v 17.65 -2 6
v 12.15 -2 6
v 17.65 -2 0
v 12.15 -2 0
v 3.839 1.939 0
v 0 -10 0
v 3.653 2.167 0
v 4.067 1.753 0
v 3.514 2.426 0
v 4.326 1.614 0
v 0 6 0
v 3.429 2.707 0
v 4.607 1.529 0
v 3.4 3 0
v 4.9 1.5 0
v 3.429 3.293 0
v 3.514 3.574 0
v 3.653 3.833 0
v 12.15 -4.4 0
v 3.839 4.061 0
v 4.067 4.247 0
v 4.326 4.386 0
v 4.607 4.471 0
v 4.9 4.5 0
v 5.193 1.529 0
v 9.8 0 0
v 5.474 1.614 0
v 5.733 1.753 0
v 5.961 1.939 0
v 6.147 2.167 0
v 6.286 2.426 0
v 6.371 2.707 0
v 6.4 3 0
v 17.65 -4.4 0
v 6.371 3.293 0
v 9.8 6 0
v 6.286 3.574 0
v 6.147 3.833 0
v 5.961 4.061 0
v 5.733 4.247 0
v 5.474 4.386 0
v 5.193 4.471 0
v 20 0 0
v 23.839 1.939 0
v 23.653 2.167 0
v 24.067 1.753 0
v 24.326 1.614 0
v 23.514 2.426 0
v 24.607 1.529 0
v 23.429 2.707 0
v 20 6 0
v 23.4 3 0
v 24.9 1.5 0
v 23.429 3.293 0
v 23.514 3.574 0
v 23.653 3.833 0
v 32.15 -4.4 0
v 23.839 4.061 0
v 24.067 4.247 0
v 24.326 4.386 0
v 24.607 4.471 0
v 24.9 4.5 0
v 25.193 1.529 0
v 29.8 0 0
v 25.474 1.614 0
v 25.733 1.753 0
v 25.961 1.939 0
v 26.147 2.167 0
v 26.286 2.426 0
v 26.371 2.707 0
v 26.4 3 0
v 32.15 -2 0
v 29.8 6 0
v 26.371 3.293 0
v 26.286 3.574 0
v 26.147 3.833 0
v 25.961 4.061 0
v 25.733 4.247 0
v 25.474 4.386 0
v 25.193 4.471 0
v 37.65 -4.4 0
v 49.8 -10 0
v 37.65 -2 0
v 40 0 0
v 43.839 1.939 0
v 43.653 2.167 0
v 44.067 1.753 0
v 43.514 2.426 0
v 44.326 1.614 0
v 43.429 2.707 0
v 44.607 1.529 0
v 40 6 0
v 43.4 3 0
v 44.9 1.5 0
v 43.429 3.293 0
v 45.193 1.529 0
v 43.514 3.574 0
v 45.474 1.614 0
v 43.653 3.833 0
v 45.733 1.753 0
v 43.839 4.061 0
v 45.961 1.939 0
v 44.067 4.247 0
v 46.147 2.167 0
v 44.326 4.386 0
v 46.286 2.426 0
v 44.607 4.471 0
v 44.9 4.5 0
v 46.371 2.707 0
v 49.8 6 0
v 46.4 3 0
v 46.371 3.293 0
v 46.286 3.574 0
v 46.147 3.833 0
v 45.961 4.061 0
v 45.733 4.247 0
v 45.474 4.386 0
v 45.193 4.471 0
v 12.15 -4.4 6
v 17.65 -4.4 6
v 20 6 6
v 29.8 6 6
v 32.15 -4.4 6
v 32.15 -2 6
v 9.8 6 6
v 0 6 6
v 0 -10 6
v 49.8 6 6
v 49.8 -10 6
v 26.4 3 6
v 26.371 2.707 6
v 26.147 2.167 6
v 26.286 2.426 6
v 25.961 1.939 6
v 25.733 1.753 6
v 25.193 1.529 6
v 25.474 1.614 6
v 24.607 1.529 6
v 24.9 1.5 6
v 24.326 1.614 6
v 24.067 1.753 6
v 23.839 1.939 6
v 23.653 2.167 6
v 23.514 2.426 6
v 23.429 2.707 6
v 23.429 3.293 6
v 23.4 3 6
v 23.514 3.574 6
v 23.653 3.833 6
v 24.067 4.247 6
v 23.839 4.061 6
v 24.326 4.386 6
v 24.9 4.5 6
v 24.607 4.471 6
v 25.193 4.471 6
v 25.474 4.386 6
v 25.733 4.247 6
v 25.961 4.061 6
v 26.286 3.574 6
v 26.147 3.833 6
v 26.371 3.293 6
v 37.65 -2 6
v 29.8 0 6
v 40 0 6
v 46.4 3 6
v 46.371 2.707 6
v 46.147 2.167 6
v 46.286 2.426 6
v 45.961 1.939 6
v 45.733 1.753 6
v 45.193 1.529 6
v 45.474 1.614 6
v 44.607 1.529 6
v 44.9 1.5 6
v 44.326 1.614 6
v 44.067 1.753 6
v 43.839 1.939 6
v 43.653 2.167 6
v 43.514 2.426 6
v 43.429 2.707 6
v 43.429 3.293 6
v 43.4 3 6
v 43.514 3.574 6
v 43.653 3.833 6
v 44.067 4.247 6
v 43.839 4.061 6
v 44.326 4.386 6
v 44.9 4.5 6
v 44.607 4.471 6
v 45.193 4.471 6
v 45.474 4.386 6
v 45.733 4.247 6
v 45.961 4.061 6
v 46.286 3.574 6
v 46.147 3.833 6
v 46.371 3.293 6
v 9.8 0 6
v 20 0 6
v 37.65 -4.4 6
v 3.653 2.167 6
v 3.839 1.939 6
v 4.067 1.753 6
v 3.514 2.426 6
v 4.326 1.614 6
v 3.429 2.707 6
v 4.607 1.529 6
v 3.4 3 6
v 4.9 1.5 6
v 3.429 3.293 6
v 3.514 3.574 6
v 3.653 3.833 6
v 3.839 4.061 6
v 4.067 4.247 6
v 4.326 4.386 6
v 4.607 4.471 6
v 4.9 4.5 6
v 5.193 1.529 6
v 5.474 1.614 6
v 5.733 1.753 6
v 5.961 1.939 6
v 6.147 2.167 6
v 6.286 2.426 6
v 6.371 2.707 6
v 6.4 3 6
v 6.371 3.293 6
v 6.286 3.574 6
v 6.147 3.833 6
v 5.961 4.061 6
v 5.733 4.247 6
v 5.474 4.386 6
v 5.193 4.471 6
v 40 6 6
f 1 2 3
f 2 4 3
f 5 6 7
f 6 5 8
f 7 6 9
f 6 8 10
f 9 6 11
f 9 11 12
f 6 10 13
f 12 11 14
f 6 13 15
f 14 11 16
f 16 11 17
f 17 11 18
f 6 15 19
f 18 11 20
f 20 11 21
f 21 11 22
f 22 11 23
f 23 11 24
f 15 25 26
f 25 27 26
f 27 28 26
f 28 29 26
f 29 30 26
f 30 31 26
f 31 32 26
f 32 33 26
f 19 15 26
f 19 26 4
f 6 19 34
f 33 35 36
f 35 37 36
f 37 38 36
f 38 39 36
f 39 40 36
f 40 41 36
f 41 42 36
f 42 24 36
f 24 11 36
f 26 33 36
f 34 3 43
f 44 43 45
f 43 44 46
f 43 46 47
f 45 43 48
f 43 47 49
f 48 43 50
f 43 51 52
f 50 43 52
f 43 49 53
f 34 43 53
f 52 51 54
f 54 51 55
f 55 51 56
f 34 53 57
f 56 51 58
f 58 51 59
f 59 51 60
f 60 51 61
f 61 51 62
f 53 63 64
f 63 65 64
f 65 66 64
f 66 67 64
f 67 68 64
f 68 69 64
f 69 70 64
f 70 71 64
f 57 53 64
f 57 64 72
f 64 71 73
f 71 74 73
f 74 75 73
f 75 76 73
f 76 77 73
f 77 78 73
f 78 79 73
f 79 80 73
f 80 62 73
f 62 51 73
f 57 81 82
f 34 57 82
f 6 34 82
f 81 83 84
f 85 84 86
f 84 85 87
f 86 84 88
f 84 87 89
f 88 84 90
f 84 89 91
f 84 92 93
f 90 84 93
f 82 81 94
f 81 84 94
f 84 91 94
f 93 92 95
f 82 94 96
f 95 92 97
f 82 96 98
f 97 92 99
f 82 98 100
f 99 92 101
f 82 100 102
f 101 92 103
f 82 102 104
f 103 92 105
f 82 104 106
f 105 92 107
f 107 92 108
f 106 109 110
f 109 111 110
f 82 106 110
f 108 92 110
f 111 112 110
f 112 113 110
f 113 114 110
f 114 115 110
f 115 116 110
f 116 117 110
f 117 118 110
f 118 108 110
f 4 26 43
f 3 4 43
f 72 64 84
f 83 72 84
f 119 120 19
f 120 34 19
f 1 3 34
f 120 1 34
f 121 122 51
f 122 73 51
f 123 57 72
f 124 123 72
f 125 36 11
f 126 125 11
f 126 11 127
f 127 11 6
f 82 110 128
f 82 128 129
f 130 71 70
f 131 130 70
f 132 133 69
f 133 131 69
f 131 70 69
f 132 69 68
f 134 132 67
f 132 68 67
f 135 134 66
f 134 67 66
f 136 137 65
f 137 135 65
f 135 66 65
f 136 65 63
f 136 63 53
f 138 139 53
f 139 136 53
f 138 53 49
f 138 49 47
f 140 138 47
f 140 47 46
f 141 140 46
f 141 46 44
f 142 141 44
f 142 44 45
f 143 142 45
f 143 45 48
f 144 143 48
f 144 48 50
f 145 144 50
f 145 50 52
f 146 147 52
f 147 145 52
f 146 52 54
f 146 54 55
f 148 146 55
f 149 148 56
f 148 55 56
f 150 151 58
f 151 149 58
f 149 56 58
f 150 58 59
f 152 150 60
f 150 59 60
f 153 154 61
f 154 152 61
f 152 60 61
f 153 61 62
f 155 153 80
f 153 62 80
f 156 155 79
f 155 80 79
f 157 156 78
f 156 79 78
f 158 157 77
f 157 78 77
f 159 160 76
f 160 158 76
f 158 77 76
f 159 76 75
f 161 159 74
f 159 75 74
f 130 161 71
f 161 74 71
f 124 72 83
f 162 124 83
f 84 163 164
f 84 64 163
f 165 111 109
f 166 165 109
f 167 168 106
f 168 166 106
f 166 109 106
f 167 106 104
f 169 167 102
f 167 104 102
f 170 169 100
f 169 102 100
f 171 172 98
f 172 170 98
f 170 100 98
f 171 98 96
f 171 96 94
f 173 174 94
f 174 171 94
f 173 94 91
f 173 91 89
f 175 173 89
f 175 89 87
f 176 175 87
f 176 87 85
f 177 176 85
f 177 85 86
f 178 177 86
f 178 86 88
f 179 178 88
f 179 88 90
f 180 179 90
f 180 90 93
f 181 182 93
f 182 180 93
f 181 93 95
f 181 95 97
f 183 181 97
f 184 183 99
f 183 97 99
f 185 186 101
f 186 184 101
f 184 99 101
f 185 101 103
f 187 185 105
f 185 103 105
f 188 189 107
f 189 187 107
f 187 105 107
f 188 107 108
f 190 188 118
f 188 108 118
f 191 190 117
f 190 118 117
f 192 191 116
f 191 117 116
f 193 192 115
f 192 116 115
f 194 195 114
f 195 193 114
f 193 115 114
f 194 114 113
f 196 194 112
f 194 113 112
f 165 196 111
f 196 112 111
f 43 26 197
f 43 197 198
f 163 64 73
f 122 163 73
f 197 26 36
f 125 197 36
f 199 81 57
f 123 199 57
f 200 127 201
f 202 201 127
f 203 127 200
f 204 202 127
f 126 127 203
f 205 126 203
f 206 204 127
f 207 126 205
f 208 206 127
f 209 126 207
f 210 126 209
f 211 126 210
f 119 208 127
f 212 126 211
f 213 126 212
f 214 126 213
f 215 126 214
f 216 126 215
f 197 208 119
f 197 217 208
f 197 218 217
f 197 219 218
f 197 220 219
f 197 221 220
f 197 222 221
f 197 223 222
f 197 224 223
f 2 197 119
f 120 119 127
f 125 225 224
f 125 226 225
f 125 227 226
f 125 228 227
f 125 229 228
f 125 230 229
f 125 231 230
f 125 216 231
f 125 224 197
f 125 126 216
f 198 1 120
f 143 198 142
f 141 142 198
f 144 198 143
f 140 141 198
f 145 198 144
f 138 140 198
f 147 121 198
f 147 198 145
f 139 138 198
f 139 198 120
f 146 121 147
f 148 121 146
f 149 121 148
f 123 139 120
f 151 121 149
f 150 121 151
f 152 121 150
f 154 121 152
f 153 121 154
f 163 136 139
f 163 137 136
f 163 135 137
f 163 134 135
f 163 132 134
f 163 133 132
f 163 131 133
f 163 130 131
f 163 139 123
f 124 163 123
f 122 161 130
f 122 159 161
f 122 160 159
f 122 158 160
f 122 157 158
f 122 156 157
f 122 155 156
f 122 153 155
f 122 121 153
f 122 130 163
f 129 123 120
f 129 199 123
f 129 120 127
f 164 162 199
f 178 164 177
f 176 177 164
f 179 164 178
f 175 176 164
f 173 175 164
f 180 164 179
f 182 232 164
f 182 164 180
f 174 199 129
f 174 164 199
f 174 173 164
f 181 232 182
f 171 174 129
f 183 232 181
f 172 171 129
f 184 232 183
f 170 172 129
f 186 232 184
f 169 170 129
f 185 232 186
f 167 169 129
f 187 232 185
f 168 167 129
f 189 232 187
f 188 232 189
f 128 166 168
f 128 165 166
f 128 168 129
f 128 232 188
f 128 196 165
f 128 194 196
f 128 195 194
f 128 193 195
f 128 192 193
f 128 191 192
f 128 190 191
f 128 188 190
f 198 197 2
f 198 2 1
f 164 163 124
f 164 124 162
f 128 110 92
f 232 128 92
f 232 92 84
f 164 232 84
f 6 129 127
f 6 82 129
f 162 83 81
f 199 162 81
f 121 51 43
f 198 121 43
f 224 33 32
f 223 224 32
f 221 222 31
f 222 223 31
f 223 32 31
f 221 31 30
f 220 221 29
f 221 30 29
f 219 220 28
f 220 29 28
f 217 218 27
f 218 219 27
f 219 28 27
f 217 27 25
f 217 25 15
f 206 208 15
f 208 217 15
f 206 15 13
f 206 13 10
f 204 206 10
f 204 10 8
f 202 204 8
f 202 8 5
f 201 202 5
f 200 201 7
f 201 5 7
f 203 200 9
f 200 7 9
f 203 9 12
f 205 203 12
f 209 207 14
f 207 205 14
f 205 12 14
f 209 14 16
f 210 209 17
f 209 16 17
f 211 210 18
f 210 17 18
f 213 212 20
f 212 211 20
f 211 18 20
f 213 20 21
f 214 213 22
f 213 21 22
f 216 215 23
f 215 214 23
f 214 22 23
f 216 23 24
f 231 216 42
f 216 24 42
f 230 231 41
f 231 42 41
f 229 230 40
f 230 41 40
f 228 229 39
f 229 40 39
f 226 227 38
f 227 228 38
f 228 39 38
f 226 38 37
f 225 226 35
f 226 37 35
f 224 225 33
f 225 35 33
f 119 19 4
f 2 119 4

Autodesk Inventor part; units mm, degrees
ref_plane "YZ Plane" through (0, 0, 0) normal (1, 0, 0) x (0, 1, 0)
ref_plane "XZ Plane" through (0, 0, 0) normal (0, 1, 0) x (-1, 0, 0)
ref_plane "XY Plane" through (0, 0, 0) normal (0, 0, 1) x (1, 0, 0)
sketch "Sketch1" plane through (0, 0, 0) normal (0, 0, 1) x (1, 0, 0)
  line L0 (0, 0) -> (9.8, 0)
  line L1 (9.8, 0) -> (9.8, 6)
  line L2 (9.8, 6) -> (0, 6)
  line L3 (0, 6) -> (0, 0)
  line L4 (29.8, 6) -> (20, 6)
  line L5 (20, 6) -> (20, 0)
  line L6 (20, 0) -> (29.8, 0)
  line L7 (29.8, 0) -> (29.8, 6)
  line L8 (49.8, 6) -> (40, 6)
  line L9 (40, 6) -> (40, 0)
  line L10 (40, 0) -> (49.8, 0)
  line L11 (49.8, 0) -> (49.8, 6)
  circle A0 centre (4.9, 3) radius 1.5
  circle A1 centre (24.9, 3) radius 1.5
  circle A2 centre (44.9, 3) radius 1.5
  line L12 (0, 0) -> (49.8, 0)
  line L13 (49.8, 0) -> (49.8, -10)
  line L14 (49.8, -10) -> (0, -10)
  line L15 (0, -10) -> (0, 0)
  line L16 (12.15, -2) -> (17.65, -2)
  line L17 (17.65, -2) -> (17.65, -4.4)
  line L18 (17.65, -4.4) -> (12.15, -4.4)
  line L19 (12.15, -4.4) -> (12.15, -2)
  line L20 (32.15, -2) -> (37.65, -2)
  line L21 (37.65, -2) -> (37.65, -4.4)
  line L22 (37.65, -4.4) -> (32.15, -4.4)
  line L23 (32.15, -4.4) -> (32.15, -2)
  point P0 (40, 0)
  point P1 (20, 0)
  dimension "d0" = 6
  dimension "d1" = 9.8
  dimension "d4" = 20
  dimension "d9" = 3
  dimension "d12" = 20
  dimension "d17" = 10
  dimension "d20" = 5.5
  dimension "d21" = 2.4
  dimension "d22" = 2.35
  dimension "d23" = 8
  dimension "d24" = 3
  dimension "d27" = 20
extrude "Extrusion1" add sketch "Sketch1" along normal blind 6
properties part number "SideBoardTest"
